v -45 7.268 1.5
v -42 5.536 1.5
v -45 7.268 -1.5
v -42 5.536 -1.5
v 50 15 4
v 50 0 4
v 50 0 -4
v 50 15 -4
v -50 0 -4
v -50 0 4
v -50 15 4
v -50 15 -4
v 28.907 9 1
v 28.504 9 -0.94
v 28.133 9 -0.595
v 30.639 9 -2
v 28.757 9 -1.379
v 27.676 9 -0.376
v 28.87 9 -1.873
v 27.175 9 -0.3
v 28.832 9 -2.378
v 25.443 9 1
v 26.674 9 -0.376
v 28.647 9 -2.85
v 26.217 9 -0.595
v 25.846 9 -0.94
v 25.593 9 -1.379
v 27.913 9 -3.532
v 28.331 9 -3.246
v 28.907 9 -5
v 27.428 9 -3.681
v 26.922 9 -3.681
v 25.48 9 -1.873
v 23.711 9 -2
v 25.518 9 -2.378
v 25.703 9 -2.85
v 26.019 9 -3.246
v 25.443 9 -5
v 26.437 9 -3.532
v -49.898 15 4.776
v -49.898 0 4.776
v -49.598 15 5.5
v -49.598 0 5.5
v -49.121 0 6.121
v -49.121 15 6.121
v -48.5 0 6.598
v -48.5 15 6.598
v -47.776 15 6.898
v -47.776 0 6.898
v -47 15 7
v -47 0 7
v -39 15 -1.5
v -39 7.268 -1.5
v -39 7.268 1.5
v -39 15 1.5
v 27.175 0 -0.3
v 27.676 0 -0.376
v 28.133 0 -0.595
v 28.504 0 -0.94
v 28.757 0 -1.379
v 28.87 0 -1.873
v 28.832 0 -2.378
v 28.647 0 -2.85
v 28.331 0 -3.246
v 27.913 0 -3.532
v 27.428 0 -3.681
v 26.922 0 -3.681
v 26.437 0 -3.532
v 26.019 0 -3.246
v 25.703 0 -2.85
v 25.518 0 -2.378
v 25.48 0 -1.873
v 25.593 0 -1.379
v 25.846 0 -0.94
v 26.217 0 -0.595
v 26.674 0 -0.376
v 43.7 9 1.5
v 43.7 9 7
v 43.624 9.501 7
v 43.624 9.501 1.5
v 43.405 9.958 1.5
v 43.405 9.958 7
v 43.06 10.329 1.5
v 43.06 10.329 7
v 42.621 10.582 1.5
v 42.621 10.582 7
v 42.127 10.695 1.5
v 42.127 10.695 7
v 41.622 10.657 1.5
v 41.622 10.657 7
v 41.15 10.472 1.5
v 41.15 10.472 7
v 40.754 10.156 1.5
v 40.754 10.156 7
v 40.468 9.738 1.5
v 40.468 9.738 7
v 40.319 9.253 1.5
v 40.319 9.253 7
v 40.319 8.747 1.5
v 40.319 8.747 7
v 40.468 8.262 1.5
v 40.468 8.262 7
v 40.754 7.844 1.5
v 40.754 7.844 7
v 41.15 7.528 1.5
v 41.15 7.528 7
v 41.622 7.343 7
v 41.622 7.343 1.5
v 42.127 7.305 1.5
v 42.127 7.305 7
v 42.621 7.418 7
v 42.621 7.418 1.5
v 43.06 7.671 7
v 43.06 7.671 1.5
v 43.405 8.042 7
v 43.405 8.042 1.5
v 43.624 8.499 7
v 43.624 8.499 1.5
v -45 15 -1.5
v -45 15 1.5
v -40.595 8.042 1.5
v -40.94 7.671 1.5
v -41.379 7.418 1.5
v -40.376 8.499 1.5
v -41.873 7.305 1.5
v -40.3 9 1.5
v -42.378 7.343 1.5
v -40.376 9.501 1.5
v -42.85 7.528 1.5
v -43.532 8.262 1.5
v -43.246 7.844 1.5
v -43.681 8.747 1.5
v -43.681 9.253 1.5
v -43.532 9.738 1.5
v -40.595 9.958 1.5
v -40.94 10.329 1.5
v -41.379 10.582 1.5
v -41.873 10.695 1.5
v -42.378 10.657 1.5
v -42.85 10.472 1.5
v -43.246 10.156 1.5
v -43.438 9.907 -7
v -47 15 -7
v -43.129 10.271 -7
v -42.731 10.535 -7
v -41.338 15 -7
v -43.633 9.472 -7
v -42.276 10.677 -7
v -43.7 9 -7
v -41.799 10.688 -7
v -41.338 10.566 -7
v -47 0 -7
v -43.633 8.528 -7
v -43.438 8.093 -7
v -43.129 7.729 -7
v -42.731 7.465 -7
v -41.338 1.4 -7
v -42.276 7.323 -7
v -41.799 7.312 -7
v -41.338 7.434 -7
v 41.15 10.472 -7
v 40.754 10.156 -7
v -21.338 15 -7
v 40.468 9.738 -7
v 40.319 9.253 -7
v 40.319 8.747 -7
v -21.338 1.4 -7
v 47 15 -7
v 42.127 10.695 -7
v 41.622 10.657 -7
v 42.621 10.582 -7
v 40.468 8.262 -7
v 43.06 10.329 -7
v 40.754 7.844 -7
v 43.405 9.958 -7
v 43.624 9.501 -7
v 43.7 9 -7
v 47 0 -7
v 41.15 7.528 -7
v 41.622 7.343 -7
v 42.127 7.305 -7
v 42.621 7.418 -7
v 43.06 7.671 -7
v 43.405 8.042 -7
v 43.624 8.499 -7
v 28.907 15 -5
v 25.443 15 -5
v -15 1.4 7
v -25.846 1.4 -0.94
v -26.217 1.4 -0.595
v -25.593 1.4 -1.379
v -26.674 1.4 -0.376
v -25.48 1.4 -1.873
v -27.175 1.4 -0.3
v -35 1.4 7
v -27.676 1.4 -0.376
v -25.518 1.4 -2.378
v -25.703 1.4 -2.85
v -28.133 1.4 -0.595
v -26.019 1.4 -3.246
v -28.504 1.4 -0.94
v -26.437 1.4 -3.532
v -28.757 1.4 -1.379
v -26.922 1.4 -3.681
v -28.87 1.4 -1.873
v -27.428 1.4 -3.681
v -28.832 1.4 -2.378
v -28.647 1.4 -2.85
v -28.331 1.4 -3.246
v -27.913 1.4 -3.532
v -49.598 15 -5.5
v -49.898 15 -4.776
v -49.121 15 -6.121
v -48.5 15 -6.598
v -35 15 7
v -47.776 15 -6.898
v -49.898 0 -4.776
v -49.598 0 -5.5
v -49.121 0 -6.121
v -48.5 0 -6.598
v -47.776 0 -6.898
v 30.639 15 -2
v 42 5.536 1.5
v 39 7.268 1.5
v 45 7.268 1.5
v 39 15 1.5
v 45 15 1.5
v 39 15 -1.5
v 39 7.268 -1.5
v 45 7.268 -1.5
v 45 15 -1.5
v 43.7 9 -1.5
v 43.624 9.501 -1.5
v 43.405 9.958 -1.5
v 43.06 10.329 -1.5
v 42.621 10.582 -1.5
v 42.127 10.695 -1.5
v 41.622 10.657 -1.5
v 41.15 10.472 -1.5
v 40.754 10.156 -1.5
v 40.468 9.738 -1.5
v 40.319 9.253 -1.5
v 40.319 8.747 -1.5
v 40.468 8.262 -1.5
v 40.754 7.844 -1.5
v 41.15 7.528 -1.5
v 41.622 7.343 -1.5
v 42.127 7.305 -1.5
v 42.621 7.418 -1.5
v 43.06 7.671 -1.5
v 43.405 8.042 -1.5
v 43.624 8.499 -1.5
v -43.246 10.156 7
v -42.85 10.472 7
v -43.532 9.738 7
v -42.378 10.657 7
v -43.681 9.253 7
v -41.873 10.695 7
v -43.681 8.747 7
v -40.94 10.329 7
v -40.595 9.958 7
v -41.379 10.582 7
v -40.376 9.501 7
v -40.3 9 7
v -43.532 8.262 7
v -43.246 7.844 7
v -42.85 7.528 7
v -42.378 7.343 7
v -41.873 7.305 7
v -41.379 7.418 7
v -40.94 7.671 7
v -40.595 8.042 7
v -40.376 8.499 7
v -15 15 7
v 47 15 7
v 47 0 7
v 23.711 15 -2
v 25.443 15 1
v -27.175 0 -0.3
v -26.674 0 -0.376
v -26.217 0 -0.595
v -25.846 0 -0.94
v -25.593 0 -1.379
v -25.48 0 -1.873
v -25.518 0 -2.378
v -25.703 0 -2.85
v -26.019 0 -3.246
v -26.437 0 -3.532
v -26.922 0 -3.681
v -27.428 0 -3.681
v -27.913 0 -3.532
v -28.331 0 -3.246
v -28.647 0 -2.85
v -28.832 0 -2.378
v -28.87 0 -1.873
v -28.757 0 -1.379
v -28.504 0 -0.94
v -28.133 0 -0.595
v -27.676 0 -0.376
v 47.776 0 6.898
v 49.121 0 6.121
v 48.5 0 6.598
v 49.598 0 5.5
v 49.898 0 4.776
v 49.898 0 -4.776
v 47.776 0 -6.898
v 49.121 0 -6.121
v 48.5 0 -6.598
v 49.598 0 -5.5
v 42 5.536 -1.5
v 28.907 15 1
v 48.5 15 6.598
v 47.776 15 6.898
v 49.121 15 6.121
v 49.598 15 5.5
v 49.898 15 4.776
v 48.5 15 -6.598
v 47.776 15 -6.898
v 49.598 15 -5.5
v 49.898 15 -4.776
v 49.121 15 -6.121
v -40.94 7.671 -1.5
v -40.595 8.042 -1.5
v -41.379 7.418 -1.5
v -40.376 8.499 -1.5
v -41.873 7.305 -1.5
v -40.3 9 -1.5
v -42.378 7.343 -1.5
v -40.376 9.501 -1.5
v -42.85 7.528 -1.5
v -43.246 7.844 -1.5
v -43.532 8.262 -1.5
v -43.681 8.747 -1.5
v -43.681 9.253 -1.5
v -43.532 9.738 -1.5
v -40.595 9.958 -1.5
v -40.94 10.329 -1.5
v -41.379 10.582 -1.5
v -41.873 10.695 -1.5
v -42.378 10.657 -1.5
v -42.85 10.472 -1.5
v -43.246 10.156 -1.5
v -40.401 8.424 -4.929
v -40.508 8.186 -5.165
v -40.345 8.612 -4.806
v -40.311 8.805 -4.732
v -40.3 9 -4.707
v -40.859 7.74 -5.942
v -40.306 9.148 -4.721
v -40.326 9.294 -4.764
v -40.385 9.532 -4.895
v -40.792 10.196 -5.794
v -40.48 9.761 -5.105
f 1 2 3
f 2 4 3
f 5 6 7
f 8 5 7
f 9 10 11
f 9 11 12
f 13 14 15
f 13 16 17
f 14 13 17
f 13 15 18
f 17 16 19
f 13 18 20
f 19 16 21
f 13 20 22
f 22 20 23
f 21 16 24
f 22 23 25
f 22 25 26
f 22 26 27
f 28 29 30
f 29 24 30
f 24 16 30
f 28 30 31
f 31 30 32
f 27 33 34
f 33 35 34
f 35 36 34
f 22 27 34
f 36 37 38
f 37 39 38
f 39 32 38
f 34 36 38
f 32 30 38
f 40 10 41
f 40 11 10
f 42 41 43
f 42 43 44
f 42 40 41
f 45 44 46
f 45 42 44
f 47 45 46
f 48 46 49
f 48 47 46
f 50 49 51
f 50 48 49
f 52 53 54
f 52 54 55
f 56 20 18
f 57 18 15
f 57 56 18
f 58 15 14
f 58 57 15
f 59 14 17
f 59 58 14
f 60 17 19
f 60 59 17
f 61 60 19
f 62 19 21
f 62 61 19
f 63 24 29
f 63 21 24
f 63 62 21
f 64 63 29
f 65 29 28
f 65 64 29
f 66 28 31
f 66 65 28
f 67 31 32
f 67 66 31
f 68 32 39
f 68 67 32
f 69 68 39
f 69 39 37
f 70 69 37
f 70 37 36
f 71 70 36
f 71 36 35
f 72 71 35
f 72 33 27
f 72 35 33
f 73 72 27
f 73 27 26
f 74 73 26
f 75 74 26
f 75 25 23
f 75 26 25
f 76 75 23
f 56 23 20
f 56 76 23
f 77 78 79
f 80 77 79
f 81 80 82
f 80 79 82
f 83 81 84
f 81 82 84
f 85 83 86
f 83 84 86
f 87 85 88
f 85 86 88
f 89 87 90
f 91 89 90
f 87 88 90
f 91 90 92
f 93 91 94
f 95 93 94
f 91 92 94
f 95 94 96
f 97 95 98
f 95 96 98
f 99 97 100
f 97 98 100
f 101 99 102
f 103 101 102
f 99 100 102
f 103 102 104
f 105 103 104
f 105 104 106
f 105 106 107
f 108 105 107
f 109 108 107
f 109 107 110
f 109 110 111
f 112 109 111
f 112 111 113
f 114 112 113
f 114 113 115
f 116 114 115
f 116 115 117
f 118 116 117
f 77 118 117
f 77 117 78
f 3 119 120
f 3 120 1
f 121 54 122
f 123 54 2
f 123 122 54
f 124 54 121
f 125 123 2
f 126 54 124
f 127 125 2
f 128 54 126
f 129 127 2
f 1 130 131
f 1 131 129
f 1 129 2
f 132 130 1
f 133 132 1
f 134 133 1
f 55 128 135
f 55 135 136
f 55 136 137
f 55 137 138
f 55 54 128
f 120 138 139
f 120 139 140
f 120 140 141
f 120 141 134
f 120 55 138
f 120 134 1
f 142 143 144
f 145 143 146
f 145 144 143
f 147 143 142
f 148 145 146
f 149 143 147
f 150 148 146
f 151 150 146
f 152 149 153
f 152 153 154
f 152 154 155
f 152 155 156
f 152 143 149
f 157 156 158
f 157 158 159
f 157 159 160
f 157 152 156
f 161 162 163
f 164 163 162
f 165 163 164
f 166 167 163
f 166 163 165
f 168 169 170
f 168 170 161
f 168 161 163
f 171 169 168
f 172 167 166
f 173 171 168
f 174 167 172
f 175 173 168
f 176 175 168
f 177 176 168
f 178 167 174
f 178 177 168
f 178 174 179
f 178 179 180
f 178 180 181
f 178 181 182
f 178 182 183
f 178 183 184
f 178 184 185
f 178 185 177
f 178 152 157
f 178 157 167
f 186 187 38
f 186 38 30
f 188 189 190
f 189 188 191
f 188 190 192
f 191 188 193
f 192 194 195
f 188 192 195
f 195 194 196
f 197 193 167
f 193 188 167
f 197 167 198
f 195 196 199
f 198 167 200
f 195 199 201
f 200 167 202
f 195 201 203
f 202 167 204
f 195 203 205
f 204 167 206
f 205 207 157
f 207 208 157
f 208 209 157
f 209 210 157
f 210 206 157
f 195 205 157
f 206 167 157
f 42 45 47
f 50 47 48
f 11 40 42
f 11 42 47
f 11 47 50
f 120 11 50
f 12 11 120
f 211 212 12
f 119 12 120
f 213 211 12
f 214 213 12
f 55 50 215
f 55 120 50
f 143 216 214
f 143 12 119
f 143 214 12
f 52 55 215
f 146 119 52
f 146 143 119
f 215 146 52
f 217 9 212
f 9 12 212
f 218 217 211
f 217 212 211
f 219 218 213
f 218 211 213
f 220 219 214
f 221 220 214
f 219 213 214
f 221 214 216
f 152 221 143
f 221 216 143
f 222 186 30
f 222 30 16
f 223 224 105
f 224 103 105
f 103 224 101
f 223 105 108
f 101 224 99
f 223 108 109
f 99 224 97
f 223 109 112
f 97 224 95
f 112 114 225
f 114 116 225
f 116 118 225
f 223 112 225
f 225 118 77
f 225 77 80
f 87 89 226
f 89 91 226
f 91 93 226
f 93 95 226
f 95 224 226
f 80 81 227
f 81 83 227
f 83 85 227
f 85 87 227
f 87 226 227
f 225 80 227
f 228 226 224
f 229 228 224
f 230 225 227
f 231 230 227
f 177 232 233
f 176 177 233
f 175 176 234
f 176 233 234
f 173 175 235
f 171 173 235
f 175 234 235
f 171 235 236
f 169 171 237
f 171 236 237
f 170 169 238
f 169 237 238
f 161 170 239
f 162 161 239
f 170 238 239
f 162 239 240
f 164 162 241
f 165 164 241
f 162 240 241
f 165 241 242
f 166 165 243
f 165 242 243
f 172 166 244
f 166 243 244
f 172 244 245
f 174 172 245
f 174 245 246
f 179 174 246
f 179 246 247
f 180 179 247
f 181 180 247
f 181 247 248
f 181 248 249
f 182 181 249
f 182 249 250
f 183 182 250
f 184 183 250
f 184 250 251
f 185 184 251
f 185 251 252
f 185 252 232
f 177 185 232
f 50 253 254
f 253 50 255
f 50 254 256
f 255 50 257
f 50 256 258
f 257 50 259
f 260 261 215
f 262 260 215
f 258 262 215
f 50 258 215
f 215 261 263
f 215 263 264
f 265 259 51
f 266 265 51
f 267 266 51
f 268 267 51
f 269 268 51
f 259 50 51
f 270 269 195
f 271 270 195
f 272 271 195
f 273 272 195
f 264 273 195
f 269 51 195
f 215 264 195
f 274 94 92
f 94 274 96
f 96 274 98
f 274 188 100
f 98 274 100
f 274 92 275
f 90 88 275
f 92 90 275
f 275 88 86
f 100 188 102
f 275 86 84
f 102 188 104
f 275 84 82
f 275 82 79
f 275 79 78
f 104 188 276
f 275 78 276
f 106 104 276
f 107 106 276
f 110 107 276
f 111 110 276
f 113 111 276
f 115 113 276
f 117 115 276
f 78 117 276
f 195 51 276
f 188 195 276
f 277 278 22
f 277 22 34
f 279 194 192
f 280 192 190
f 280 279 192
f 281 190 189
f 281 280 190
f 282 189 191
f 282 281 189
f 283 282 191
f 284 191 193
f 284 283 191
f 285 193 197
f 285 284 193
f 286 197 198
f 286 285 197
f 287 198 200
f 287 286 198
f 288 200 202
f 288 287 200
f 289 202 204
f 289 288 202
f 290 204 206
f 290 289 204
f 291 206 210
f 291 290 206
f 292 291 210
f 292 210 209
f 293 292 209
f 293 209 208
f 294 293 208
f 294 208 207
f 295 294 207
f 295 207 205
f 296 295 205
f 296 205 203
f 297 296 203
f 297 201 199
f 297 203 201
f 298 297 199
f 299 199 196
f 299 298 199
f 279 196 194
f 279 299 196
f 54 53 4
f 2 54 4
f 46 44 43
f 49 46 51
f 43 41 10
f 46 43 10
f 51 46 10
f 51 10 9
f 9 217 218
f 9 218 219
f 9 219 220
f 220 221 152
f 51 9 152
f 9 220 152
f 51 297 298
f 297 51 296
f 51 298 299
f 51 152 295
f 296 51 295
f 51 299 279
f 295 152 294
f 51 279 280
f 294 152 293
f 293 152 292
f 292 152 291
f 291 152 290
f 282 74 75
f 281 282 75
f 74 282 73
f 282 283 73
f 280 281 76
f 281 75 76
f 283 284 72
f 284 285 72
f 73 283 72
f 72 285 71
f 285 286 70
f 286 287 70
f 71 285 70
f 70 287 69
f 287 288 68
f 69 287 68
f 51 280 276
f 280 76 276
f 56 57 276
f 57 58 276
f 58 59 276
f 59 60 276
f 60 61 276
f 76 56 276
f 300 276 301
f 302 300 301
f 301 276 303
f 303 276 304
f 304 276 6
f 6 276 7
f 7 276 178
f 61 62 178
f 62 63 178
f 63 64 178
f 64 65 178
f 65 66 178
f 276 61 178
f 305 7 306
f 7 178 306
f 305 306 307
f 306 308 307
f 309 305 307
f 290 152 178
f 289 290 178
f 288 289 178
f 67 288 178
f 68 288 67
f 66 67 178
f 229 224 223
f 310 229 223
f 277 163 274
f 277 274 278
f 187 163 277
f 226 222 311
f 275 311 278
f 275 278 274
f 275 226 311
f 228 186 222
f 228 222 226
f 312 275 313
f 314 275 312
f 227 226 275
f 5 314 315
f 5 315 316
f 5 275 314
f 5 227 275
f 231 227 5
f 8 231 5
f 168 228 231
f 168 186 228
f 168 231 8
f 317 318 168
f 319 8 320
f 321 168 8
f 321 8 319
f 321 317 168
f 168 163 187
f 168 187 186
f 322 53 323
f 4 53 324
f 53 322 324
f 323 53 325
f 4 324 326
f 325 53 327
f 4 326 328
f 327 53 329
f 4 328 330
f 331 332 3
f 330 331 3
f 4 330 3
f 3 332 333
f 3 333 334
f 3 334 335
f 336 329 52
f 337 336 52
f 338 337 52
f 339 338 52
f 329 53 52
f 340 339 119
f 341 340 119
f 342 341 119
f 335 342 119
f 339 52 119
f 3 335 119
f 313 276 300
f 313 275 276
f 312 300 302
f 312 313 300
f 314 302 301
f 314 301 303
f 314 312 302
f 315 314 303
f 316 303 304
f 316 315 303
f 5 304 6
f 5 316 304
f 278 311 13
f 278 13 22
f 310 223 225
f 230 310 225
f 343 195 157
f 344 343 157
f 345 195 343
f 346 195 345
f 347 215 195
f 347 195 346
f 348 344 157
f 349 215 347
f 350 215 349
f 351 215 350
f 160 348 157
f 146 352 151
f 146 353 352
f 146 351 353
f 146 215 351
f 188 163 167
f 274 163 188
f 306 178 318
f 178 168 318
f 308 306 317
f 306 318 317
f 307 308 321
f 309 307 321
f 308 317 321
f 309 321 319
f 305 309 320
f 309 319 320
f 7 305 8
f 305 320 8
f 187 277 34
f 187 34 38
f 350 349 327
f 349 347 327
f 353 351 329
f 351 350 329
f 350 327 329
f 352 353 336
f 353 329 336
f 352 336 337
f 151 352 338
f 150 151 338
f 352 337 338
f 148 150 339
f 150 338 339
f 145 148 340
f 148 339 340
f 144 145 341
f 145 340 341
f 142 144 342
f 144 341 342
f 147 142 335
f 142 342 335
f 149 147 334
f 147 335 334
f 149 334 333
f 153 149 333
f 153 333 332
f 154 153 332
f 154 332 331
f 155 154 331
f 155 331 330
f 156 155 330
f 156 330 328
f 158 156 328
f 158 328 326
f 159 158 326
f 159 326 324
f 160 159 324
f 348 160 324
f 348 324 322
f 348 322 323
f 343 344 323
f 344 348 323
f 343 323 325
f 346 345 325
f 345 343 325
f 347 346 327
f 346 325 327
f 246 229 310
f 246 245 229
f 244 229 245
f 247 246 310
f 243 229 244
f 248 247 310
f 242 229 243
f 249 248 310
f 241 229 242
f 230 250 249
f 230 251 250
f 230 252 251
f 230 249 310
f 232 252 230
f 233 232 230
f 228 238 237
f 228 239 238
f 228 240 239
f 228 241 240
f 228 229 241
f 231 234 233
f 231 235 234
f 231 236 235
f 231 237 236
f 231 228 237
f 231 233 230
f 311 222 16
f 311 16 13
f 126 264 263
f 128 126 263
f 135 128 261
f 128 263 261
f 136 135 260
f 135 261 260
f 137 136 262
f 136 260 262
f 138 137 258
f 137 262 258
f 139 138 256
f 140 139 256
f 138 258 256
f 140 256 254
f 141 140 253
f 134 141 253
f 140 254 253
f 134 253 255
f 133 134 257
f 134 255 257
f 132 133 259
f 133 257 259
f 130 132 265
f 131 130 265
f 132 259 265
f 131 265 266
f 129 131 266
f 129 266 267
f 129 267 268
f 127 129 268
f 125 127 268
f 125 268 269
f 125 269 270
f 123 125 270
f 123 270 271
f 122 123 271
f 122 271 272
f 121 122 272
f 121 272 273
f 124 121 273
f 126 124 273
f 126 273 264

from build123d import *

# Parameters (mm, degrees)
SKETCH1_W           = 100
SKETCH1_H           = 14
SKETCH1_R           = 1.7
BOSS_EXTRUDE1_DEPTH = 15
SKETCH3_R           = 1.7
CUT_EXTRUDE2_DEPTH  = 55.046276467
CUT_EXTRUDE3_START  = -7
CUT_EXTRUDE3_DEPTH  = 1.5
CUT_EXTRUDE4_DEPTH  = 6
FILLET4_R           = 3
CUT_EXTRUDE5_DEPTH  = 13.6


with BuildPart() as part:
    # Sketch1 → Boss-Extrude1 (new body)
    with BuildSketch(Plane(origin=(0, 0, 0), x_dir=(1, 0, 0), z_dir=(0, 1, 0))):
        Rectangle(SKETCH1_W, SKETCH1_H)
        with Locations(Location((-27.175, 2, 0), (0, 0, 270))):
            Circle(SKETCH1_R, mode=Mode.SUBTRACT)
        with Locations(Location((27.175, 2, 0), (0, 0, 270))):
            Circle(SKETCH1_R, mode=Mode.SUBTRACT)
    extrude(amount=BOSS_EXTRUDE1_DEPTH)

    # Sketch3 → Cut-Extrude2 (cut, through all)
    with BuildSketch(Plane.XY.offset(7)):
        with Locations((-42, 9)):
            Circle(SKETCH3_R)
        with Locations((42, 9)):
            Circle(SKETCH3_R)
    extrude(amount=-CUT_EXTRUDE2_DEPTH, mode=Mode.SUBTRACT)

    # Sketch4 → Cut-Extrude3 (cut, symmetric)
    with BuildSketch(Plane.XY.offset(7).offset(CUT_EXTRUDE3_START)):
        Polygon((-45, 10.732050808), (-45, 16.451909609), (-39, 16.451909609), (-39, 10.732050808), (-39, 7.267949192), (-42, 5.535898385), (-45, 7.267949192), align=None)
        Polygon((39, 16.451909609), (39, 10.732050808), (39, 7.267949192), (42, 5.535898385), (45, 7.267949192), (45, 10.732050808), (45, 16.451909609), align=None)
    extrude(amount=CUT_EXTRUDE3_DEPTH, both=True, mode=Mode.SUBTRACT)

    # Sketch5 → Cut-Extrude4 (cut)
    with BuildSketch(Plane(origin=(0, 15, 0), x_dir=(1, 0, 0), z_dir=(0, 1, 0))):
        Polygon((25.442949192, -1), (23.710898385, 2), (25.442949192, 5), (28.907050808, 5), (30.639101615, 2), (28.907050808, -1), align=None)
    extrude(amount=-CUT_EXTRUDE4_DEPTH, mode=Mode.SUBTRACT)

    # Fillet4
    fillet4_edges = [part.edges().sort_by_distance(p)[0] for p in [
        (50, 7.5, 7),
        (-50, 7.5, 7),
        (-50, 7.5, -7),
        (50, 7.5, -7),
    ]]
    fillet(fillet4_edges, radius=FILLET4_R)

    # Sketch6 → Cut-Extrude5 (cut)
    with BuildSketch(Plane(origin=(0, 15, 0), x_dir=(1, 0, 0), z_dir=(0, 1, 0))):
        Polygon((-35, -7), (-41.338104143, 7), (-21.338104143, 7), (-15, -7), align=None)
    extrude(amount=-CUT_EXTRUDE5_DEPTH, mode=Mode.SUBTRACT)


solid = part.part
